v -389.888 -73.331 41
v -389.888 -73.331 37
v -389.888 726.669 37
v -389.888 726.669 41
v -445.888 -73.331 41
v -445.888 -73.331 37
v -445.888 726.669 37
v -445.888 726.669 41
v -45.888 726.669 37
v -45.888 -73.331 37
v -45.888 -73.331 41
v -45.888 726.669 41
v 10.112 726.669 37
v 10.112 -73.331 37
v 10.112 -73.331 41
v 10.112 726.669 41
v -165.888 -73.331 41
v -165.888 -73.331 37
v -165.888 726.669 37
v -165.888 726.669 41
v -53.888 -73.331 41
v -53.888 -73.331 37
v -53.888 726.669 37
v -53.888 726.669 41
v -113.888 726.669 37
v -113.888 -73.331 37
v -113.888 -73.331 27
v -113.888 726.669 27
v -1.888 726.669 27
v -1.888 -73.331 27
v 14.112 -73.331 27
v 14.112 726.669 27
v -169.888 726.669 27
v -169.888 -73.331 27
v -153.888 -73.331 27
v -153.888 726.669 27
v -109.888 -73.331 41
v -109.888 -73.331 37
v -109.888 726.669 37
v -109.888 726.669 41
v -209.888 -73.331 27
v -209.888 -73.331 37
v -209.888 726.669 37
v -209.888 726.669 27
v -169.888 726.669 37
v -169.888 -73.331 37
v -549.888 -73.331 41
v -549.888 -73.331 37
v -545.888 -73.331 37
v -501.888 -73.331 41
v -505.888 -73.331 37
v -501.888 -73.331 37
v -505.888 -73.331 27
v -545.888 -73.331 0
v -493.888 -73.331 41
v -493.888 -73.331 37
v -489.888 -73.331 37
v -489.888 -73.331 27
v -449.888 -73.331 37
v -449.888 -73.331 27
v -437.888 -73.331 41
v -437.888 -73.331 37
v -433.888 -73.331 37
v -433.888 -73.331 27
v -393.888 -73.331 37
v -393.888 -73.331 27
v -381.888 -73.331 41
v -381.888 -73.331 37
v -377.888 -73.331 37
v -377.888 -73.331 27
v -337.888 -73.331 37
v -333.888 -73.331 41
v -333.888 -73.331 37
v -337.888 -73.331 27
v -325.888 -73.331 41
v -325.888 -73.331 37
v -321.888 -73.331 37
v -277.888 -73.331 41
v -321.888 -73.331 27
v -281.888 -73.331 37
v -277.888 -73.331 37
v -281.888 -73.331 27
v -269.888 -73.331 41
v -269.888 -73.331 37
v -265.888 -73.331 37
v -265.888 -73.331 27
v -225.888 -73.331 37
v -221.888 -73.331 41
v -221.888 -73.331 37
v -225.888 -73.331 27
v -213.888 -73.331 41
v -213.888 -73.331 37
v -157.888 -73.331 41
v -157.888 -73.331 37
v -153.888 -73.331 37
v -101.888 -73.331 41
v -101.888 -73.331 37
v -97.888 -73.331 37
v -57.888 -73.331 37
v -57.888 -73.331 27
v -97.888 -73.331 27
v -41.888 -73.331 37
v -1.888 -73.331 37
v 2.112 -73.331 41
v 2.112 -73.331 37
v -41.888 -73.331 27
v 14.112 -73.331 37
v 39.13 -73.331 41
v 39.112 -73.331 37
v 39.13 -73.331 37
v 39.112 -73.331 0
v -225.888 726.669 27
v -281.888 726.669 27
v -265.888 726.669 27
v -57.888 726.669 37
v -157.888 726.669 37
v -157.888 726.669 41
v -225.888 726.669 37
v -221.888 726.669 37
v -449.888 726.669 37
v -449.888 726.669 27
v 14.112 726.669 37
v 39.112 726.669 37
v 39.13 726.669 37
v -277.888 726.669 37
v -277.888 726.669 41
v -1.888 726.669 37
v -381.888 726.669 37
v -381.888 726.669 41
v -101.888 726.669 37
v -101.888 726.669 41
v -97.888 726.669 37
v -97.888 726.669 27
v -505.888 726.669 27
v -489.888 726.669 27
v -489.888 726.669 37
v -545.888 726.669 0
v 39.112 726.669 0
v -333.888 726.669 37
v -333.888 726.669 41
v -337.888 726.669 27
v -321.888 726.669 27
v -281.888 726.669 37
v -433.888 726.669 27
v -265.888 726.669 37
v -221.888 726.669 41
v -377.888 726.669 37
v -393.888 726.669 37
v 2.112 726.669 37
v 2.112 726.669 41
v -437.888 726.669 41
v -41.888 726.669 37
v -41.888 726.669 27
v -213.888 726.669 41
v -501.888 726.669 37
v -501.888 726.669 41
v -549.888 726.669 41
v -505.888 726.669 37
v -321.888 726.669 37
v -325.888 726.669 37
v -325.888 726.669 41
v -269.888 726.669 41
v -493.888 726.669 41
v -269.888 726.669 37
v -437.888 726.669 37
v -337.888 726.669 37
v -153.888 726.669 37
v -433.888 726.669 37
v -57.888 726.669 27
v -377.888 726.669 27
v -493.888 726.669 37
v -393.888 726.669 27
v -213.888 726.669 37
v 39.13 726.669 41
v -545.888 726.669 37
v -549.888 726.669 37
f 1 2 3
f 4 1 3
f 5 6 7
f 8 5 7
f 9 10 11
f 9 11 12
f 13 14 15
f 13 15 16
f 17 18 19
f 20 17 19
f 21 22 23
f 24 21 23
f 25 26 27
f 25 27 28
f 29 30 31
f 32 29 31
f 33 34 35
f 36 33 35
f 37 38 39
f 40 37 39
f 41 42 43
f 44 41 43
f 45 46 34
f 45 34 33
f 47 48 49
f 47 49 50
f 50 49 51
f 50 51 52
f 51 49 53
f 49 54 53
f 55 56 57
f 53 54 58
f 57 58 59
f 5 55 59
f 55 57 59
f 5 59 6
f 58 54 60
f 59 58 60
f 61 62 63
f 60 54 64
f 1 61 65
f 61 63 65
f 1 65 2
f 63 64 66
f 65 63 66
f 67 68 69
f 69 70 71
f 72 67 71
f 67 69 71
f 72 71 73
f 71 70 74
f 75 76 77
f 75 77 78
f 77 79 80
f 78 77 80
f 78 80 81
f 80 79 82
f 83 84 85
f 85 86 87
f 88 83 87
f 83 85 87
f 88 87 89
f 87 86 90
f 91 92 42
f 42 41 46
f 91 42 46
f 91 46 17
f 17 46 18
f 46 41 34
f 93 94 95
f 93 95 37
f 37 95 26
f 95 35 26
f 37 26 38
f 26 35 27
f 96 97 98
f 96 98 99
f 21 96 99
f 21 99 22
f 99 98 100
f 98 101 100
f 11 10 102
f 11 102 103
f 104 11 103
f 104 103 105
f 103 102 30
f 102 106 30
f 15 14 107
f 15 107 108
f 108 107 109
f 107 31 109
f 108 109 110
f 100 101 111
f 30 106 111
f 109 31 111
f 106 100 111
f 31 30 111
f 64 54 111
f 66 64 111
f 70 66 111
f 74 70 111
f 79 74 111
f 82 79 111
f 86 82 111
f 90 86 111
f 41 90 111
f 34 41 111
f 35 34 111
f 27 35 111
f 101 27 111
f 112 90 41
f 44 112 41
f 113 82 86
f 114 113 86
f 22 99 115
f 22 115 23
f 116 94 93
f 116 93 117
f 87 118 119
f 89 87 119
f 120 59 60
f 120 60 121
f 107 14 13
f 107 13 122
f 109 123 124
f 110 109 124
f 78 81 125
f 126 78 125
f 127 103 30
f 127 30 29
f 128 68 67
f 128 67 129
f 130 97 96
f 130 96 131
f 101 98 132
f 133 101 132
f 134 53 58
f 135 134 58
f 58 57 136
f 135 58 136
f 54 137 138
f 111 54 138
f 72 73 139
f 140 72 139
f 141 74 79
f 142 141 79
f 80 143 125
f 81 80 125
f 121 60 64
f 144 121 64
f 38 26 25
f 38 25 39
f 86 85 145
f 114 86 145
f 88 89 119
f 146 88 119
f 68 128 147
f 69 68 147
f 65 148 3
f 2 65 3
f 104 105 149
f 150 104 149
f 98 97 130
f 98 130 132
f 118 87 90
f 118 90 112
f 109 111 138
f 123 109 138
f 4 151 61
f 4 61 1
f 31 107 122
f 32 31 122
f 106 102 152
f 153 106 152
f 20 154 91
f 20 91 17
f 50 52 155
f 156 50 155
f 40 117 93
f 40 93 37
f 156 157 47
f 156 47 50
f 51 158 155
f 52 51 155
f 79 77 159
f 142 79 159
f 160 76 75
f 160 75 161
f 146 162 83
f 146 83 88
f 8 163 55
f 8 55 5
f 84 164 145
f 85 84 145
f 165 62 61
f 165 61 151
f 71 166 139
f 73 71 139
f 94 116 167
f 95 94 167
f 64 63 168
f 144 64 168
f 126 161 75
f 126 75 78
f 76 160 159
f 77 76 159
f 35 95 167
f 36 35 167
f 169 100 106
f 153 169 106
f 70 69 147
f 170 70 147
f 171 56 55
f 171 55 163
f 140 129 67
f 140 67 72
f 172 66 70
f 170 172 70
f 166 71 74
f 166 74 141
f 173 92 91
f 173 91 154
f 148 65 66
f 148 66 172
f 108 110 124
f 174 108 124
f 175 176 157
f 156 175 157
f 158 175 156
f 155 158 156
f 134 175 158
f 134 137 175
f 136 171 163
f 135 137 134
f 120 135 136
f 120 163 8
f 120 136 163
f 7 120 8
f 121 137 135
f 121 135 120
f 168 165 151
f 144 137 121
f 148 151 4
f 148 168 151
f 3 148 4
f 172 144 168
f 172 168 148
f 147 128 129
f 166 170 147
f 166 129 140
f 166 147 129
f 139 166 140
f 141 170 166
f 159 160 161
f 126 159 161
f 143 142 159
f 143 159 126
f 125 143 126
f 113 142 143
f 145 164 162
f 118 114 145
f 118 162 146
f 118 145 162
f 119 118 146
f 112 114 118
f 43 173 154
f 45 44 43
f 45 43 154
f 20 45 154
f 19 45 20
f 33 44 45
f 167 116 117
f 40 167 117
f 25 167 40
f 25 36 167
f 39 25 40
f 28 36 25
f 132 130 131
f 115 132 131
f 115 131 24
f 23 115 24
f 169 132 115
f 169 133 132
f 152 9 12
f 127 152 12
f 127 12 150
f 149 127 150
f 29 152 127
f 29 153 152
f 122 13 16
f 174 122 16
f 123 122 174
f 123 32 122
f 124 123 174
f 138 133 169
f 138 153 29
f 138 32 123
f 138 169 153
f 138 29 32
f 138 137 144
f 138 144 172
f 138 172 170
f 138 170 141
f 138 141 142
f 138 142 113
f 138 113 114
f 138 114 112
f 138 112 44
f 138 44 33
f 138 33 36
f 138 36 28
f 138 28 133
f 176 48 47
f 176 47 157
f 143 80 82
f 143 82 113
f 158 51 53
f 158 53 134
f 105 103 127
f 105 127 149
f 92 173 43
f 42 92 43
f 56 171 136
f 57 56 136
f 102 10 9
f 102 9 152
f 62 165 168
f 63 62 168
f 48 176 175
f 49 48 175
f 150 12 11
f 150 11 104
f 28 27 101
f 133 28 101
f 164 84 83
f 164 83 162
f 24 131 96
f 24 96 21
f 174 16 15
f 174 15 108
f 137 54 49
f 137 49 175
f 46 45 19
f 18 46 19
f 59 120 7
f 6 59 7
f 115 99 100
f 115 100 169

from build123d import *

# Parameters (mm, degrees)
F0_W     = 585
F0_H     = 800
F1_DEPTH = 37
F2_W     = 16
F2_H     = 800
F3_DEPTH = 10
F4_W     = 48
F4_H     = 800
F4_W_2   = 29.018198
F5_DEPTH = 4


with BuildPart() as f1:
    # F0 (on Top) → F1 (new body)
    with BuildSketch(Plane.XY):
        with Locations((-253.387954, 326.668771)):
            Rectangle(F0_W, F0_H)
    extrude(amount=F1_DEPTH)

    # F2 (on face) → F3 (cut)
    with BuildSketch(Plane.XY.offset(37)):
        with Locations((-497.887954, 326.668771)):
            Rectangle(F2_W, F2_H)
        with Locations((-441.887954, 326.668771)):
            Rectangle(F2_W, F2_H)
        with Locations((-385.887954, 326.668771)):
            Rectangle(F2_W, F2_H)
        with Locations((-329.887954, 326.668771)):
            Rectangle(F2_W, F2_H)
        with Locations((-273.887954, 326.668771)):
            Rectangle(F2_W, F2_H)
        with Locations((-217.887954, 326.668771)):
            Rectangle(F2_W, F2_H)
        with Locations((-161.887954, 326.668771)):
            Rectangle(F2_W, F2_H)
        with Locations((-105.887954, 326.668771)):
            Rectangle(F2_W, F2_H)
        with Locations((-49.887954, 326.668771)):
            Rectangle(F2_W, F2_H)
        with Locations((6.112046, 326.668771)):
            Rectangle(F2_W, F2_H)
    extrude(amount=-F3_DEPTH, mode=Mode.SUBTRACT)

    # F4 (on face) → F5 (join)
    with BuildSketch(Plane.XY.offset(37)):
        with Locations((-525.887954, 326.668771)):
            Rectangle(F4_W, F4_H)
        with Locations((-469.887954, 326.668771)):
            Rectangle(F4_W, F4_H)
        with Locations((-413.887954, 326.668771)):
            Rectangle(F4_W, F4_H)
        with Locations((-357.887954, 326.668771)):
            Rectangle(F4_W, F4_H)
        with Locations((-301.887954, 326.668771)):
            Rectangle(F4_W, F4_H)
        with Locations((-245.887954, 326.668771)):
            Rectangle(F4_W, F4_H)
        with Locations((-189.887954, 326.668771)):
            Rectangle(F4_W, F4_H)
        with Locations((-133.887954, 326.668771)):
            Rectangle(F4_W, F4_H)
        with Locations((-77.887954, 326.668771)):
            Rectangle(F4_W, F4_H)
        with Locations((-21.887954, 326.668771)):
            Rectangle(F4_W, F4_H)
        with Locations((24.621145, 326.668771)):
            Rectangle(F4_W_2, F4_H)
    extrude(amount=F5_DEPTH)


solid = f1.part
